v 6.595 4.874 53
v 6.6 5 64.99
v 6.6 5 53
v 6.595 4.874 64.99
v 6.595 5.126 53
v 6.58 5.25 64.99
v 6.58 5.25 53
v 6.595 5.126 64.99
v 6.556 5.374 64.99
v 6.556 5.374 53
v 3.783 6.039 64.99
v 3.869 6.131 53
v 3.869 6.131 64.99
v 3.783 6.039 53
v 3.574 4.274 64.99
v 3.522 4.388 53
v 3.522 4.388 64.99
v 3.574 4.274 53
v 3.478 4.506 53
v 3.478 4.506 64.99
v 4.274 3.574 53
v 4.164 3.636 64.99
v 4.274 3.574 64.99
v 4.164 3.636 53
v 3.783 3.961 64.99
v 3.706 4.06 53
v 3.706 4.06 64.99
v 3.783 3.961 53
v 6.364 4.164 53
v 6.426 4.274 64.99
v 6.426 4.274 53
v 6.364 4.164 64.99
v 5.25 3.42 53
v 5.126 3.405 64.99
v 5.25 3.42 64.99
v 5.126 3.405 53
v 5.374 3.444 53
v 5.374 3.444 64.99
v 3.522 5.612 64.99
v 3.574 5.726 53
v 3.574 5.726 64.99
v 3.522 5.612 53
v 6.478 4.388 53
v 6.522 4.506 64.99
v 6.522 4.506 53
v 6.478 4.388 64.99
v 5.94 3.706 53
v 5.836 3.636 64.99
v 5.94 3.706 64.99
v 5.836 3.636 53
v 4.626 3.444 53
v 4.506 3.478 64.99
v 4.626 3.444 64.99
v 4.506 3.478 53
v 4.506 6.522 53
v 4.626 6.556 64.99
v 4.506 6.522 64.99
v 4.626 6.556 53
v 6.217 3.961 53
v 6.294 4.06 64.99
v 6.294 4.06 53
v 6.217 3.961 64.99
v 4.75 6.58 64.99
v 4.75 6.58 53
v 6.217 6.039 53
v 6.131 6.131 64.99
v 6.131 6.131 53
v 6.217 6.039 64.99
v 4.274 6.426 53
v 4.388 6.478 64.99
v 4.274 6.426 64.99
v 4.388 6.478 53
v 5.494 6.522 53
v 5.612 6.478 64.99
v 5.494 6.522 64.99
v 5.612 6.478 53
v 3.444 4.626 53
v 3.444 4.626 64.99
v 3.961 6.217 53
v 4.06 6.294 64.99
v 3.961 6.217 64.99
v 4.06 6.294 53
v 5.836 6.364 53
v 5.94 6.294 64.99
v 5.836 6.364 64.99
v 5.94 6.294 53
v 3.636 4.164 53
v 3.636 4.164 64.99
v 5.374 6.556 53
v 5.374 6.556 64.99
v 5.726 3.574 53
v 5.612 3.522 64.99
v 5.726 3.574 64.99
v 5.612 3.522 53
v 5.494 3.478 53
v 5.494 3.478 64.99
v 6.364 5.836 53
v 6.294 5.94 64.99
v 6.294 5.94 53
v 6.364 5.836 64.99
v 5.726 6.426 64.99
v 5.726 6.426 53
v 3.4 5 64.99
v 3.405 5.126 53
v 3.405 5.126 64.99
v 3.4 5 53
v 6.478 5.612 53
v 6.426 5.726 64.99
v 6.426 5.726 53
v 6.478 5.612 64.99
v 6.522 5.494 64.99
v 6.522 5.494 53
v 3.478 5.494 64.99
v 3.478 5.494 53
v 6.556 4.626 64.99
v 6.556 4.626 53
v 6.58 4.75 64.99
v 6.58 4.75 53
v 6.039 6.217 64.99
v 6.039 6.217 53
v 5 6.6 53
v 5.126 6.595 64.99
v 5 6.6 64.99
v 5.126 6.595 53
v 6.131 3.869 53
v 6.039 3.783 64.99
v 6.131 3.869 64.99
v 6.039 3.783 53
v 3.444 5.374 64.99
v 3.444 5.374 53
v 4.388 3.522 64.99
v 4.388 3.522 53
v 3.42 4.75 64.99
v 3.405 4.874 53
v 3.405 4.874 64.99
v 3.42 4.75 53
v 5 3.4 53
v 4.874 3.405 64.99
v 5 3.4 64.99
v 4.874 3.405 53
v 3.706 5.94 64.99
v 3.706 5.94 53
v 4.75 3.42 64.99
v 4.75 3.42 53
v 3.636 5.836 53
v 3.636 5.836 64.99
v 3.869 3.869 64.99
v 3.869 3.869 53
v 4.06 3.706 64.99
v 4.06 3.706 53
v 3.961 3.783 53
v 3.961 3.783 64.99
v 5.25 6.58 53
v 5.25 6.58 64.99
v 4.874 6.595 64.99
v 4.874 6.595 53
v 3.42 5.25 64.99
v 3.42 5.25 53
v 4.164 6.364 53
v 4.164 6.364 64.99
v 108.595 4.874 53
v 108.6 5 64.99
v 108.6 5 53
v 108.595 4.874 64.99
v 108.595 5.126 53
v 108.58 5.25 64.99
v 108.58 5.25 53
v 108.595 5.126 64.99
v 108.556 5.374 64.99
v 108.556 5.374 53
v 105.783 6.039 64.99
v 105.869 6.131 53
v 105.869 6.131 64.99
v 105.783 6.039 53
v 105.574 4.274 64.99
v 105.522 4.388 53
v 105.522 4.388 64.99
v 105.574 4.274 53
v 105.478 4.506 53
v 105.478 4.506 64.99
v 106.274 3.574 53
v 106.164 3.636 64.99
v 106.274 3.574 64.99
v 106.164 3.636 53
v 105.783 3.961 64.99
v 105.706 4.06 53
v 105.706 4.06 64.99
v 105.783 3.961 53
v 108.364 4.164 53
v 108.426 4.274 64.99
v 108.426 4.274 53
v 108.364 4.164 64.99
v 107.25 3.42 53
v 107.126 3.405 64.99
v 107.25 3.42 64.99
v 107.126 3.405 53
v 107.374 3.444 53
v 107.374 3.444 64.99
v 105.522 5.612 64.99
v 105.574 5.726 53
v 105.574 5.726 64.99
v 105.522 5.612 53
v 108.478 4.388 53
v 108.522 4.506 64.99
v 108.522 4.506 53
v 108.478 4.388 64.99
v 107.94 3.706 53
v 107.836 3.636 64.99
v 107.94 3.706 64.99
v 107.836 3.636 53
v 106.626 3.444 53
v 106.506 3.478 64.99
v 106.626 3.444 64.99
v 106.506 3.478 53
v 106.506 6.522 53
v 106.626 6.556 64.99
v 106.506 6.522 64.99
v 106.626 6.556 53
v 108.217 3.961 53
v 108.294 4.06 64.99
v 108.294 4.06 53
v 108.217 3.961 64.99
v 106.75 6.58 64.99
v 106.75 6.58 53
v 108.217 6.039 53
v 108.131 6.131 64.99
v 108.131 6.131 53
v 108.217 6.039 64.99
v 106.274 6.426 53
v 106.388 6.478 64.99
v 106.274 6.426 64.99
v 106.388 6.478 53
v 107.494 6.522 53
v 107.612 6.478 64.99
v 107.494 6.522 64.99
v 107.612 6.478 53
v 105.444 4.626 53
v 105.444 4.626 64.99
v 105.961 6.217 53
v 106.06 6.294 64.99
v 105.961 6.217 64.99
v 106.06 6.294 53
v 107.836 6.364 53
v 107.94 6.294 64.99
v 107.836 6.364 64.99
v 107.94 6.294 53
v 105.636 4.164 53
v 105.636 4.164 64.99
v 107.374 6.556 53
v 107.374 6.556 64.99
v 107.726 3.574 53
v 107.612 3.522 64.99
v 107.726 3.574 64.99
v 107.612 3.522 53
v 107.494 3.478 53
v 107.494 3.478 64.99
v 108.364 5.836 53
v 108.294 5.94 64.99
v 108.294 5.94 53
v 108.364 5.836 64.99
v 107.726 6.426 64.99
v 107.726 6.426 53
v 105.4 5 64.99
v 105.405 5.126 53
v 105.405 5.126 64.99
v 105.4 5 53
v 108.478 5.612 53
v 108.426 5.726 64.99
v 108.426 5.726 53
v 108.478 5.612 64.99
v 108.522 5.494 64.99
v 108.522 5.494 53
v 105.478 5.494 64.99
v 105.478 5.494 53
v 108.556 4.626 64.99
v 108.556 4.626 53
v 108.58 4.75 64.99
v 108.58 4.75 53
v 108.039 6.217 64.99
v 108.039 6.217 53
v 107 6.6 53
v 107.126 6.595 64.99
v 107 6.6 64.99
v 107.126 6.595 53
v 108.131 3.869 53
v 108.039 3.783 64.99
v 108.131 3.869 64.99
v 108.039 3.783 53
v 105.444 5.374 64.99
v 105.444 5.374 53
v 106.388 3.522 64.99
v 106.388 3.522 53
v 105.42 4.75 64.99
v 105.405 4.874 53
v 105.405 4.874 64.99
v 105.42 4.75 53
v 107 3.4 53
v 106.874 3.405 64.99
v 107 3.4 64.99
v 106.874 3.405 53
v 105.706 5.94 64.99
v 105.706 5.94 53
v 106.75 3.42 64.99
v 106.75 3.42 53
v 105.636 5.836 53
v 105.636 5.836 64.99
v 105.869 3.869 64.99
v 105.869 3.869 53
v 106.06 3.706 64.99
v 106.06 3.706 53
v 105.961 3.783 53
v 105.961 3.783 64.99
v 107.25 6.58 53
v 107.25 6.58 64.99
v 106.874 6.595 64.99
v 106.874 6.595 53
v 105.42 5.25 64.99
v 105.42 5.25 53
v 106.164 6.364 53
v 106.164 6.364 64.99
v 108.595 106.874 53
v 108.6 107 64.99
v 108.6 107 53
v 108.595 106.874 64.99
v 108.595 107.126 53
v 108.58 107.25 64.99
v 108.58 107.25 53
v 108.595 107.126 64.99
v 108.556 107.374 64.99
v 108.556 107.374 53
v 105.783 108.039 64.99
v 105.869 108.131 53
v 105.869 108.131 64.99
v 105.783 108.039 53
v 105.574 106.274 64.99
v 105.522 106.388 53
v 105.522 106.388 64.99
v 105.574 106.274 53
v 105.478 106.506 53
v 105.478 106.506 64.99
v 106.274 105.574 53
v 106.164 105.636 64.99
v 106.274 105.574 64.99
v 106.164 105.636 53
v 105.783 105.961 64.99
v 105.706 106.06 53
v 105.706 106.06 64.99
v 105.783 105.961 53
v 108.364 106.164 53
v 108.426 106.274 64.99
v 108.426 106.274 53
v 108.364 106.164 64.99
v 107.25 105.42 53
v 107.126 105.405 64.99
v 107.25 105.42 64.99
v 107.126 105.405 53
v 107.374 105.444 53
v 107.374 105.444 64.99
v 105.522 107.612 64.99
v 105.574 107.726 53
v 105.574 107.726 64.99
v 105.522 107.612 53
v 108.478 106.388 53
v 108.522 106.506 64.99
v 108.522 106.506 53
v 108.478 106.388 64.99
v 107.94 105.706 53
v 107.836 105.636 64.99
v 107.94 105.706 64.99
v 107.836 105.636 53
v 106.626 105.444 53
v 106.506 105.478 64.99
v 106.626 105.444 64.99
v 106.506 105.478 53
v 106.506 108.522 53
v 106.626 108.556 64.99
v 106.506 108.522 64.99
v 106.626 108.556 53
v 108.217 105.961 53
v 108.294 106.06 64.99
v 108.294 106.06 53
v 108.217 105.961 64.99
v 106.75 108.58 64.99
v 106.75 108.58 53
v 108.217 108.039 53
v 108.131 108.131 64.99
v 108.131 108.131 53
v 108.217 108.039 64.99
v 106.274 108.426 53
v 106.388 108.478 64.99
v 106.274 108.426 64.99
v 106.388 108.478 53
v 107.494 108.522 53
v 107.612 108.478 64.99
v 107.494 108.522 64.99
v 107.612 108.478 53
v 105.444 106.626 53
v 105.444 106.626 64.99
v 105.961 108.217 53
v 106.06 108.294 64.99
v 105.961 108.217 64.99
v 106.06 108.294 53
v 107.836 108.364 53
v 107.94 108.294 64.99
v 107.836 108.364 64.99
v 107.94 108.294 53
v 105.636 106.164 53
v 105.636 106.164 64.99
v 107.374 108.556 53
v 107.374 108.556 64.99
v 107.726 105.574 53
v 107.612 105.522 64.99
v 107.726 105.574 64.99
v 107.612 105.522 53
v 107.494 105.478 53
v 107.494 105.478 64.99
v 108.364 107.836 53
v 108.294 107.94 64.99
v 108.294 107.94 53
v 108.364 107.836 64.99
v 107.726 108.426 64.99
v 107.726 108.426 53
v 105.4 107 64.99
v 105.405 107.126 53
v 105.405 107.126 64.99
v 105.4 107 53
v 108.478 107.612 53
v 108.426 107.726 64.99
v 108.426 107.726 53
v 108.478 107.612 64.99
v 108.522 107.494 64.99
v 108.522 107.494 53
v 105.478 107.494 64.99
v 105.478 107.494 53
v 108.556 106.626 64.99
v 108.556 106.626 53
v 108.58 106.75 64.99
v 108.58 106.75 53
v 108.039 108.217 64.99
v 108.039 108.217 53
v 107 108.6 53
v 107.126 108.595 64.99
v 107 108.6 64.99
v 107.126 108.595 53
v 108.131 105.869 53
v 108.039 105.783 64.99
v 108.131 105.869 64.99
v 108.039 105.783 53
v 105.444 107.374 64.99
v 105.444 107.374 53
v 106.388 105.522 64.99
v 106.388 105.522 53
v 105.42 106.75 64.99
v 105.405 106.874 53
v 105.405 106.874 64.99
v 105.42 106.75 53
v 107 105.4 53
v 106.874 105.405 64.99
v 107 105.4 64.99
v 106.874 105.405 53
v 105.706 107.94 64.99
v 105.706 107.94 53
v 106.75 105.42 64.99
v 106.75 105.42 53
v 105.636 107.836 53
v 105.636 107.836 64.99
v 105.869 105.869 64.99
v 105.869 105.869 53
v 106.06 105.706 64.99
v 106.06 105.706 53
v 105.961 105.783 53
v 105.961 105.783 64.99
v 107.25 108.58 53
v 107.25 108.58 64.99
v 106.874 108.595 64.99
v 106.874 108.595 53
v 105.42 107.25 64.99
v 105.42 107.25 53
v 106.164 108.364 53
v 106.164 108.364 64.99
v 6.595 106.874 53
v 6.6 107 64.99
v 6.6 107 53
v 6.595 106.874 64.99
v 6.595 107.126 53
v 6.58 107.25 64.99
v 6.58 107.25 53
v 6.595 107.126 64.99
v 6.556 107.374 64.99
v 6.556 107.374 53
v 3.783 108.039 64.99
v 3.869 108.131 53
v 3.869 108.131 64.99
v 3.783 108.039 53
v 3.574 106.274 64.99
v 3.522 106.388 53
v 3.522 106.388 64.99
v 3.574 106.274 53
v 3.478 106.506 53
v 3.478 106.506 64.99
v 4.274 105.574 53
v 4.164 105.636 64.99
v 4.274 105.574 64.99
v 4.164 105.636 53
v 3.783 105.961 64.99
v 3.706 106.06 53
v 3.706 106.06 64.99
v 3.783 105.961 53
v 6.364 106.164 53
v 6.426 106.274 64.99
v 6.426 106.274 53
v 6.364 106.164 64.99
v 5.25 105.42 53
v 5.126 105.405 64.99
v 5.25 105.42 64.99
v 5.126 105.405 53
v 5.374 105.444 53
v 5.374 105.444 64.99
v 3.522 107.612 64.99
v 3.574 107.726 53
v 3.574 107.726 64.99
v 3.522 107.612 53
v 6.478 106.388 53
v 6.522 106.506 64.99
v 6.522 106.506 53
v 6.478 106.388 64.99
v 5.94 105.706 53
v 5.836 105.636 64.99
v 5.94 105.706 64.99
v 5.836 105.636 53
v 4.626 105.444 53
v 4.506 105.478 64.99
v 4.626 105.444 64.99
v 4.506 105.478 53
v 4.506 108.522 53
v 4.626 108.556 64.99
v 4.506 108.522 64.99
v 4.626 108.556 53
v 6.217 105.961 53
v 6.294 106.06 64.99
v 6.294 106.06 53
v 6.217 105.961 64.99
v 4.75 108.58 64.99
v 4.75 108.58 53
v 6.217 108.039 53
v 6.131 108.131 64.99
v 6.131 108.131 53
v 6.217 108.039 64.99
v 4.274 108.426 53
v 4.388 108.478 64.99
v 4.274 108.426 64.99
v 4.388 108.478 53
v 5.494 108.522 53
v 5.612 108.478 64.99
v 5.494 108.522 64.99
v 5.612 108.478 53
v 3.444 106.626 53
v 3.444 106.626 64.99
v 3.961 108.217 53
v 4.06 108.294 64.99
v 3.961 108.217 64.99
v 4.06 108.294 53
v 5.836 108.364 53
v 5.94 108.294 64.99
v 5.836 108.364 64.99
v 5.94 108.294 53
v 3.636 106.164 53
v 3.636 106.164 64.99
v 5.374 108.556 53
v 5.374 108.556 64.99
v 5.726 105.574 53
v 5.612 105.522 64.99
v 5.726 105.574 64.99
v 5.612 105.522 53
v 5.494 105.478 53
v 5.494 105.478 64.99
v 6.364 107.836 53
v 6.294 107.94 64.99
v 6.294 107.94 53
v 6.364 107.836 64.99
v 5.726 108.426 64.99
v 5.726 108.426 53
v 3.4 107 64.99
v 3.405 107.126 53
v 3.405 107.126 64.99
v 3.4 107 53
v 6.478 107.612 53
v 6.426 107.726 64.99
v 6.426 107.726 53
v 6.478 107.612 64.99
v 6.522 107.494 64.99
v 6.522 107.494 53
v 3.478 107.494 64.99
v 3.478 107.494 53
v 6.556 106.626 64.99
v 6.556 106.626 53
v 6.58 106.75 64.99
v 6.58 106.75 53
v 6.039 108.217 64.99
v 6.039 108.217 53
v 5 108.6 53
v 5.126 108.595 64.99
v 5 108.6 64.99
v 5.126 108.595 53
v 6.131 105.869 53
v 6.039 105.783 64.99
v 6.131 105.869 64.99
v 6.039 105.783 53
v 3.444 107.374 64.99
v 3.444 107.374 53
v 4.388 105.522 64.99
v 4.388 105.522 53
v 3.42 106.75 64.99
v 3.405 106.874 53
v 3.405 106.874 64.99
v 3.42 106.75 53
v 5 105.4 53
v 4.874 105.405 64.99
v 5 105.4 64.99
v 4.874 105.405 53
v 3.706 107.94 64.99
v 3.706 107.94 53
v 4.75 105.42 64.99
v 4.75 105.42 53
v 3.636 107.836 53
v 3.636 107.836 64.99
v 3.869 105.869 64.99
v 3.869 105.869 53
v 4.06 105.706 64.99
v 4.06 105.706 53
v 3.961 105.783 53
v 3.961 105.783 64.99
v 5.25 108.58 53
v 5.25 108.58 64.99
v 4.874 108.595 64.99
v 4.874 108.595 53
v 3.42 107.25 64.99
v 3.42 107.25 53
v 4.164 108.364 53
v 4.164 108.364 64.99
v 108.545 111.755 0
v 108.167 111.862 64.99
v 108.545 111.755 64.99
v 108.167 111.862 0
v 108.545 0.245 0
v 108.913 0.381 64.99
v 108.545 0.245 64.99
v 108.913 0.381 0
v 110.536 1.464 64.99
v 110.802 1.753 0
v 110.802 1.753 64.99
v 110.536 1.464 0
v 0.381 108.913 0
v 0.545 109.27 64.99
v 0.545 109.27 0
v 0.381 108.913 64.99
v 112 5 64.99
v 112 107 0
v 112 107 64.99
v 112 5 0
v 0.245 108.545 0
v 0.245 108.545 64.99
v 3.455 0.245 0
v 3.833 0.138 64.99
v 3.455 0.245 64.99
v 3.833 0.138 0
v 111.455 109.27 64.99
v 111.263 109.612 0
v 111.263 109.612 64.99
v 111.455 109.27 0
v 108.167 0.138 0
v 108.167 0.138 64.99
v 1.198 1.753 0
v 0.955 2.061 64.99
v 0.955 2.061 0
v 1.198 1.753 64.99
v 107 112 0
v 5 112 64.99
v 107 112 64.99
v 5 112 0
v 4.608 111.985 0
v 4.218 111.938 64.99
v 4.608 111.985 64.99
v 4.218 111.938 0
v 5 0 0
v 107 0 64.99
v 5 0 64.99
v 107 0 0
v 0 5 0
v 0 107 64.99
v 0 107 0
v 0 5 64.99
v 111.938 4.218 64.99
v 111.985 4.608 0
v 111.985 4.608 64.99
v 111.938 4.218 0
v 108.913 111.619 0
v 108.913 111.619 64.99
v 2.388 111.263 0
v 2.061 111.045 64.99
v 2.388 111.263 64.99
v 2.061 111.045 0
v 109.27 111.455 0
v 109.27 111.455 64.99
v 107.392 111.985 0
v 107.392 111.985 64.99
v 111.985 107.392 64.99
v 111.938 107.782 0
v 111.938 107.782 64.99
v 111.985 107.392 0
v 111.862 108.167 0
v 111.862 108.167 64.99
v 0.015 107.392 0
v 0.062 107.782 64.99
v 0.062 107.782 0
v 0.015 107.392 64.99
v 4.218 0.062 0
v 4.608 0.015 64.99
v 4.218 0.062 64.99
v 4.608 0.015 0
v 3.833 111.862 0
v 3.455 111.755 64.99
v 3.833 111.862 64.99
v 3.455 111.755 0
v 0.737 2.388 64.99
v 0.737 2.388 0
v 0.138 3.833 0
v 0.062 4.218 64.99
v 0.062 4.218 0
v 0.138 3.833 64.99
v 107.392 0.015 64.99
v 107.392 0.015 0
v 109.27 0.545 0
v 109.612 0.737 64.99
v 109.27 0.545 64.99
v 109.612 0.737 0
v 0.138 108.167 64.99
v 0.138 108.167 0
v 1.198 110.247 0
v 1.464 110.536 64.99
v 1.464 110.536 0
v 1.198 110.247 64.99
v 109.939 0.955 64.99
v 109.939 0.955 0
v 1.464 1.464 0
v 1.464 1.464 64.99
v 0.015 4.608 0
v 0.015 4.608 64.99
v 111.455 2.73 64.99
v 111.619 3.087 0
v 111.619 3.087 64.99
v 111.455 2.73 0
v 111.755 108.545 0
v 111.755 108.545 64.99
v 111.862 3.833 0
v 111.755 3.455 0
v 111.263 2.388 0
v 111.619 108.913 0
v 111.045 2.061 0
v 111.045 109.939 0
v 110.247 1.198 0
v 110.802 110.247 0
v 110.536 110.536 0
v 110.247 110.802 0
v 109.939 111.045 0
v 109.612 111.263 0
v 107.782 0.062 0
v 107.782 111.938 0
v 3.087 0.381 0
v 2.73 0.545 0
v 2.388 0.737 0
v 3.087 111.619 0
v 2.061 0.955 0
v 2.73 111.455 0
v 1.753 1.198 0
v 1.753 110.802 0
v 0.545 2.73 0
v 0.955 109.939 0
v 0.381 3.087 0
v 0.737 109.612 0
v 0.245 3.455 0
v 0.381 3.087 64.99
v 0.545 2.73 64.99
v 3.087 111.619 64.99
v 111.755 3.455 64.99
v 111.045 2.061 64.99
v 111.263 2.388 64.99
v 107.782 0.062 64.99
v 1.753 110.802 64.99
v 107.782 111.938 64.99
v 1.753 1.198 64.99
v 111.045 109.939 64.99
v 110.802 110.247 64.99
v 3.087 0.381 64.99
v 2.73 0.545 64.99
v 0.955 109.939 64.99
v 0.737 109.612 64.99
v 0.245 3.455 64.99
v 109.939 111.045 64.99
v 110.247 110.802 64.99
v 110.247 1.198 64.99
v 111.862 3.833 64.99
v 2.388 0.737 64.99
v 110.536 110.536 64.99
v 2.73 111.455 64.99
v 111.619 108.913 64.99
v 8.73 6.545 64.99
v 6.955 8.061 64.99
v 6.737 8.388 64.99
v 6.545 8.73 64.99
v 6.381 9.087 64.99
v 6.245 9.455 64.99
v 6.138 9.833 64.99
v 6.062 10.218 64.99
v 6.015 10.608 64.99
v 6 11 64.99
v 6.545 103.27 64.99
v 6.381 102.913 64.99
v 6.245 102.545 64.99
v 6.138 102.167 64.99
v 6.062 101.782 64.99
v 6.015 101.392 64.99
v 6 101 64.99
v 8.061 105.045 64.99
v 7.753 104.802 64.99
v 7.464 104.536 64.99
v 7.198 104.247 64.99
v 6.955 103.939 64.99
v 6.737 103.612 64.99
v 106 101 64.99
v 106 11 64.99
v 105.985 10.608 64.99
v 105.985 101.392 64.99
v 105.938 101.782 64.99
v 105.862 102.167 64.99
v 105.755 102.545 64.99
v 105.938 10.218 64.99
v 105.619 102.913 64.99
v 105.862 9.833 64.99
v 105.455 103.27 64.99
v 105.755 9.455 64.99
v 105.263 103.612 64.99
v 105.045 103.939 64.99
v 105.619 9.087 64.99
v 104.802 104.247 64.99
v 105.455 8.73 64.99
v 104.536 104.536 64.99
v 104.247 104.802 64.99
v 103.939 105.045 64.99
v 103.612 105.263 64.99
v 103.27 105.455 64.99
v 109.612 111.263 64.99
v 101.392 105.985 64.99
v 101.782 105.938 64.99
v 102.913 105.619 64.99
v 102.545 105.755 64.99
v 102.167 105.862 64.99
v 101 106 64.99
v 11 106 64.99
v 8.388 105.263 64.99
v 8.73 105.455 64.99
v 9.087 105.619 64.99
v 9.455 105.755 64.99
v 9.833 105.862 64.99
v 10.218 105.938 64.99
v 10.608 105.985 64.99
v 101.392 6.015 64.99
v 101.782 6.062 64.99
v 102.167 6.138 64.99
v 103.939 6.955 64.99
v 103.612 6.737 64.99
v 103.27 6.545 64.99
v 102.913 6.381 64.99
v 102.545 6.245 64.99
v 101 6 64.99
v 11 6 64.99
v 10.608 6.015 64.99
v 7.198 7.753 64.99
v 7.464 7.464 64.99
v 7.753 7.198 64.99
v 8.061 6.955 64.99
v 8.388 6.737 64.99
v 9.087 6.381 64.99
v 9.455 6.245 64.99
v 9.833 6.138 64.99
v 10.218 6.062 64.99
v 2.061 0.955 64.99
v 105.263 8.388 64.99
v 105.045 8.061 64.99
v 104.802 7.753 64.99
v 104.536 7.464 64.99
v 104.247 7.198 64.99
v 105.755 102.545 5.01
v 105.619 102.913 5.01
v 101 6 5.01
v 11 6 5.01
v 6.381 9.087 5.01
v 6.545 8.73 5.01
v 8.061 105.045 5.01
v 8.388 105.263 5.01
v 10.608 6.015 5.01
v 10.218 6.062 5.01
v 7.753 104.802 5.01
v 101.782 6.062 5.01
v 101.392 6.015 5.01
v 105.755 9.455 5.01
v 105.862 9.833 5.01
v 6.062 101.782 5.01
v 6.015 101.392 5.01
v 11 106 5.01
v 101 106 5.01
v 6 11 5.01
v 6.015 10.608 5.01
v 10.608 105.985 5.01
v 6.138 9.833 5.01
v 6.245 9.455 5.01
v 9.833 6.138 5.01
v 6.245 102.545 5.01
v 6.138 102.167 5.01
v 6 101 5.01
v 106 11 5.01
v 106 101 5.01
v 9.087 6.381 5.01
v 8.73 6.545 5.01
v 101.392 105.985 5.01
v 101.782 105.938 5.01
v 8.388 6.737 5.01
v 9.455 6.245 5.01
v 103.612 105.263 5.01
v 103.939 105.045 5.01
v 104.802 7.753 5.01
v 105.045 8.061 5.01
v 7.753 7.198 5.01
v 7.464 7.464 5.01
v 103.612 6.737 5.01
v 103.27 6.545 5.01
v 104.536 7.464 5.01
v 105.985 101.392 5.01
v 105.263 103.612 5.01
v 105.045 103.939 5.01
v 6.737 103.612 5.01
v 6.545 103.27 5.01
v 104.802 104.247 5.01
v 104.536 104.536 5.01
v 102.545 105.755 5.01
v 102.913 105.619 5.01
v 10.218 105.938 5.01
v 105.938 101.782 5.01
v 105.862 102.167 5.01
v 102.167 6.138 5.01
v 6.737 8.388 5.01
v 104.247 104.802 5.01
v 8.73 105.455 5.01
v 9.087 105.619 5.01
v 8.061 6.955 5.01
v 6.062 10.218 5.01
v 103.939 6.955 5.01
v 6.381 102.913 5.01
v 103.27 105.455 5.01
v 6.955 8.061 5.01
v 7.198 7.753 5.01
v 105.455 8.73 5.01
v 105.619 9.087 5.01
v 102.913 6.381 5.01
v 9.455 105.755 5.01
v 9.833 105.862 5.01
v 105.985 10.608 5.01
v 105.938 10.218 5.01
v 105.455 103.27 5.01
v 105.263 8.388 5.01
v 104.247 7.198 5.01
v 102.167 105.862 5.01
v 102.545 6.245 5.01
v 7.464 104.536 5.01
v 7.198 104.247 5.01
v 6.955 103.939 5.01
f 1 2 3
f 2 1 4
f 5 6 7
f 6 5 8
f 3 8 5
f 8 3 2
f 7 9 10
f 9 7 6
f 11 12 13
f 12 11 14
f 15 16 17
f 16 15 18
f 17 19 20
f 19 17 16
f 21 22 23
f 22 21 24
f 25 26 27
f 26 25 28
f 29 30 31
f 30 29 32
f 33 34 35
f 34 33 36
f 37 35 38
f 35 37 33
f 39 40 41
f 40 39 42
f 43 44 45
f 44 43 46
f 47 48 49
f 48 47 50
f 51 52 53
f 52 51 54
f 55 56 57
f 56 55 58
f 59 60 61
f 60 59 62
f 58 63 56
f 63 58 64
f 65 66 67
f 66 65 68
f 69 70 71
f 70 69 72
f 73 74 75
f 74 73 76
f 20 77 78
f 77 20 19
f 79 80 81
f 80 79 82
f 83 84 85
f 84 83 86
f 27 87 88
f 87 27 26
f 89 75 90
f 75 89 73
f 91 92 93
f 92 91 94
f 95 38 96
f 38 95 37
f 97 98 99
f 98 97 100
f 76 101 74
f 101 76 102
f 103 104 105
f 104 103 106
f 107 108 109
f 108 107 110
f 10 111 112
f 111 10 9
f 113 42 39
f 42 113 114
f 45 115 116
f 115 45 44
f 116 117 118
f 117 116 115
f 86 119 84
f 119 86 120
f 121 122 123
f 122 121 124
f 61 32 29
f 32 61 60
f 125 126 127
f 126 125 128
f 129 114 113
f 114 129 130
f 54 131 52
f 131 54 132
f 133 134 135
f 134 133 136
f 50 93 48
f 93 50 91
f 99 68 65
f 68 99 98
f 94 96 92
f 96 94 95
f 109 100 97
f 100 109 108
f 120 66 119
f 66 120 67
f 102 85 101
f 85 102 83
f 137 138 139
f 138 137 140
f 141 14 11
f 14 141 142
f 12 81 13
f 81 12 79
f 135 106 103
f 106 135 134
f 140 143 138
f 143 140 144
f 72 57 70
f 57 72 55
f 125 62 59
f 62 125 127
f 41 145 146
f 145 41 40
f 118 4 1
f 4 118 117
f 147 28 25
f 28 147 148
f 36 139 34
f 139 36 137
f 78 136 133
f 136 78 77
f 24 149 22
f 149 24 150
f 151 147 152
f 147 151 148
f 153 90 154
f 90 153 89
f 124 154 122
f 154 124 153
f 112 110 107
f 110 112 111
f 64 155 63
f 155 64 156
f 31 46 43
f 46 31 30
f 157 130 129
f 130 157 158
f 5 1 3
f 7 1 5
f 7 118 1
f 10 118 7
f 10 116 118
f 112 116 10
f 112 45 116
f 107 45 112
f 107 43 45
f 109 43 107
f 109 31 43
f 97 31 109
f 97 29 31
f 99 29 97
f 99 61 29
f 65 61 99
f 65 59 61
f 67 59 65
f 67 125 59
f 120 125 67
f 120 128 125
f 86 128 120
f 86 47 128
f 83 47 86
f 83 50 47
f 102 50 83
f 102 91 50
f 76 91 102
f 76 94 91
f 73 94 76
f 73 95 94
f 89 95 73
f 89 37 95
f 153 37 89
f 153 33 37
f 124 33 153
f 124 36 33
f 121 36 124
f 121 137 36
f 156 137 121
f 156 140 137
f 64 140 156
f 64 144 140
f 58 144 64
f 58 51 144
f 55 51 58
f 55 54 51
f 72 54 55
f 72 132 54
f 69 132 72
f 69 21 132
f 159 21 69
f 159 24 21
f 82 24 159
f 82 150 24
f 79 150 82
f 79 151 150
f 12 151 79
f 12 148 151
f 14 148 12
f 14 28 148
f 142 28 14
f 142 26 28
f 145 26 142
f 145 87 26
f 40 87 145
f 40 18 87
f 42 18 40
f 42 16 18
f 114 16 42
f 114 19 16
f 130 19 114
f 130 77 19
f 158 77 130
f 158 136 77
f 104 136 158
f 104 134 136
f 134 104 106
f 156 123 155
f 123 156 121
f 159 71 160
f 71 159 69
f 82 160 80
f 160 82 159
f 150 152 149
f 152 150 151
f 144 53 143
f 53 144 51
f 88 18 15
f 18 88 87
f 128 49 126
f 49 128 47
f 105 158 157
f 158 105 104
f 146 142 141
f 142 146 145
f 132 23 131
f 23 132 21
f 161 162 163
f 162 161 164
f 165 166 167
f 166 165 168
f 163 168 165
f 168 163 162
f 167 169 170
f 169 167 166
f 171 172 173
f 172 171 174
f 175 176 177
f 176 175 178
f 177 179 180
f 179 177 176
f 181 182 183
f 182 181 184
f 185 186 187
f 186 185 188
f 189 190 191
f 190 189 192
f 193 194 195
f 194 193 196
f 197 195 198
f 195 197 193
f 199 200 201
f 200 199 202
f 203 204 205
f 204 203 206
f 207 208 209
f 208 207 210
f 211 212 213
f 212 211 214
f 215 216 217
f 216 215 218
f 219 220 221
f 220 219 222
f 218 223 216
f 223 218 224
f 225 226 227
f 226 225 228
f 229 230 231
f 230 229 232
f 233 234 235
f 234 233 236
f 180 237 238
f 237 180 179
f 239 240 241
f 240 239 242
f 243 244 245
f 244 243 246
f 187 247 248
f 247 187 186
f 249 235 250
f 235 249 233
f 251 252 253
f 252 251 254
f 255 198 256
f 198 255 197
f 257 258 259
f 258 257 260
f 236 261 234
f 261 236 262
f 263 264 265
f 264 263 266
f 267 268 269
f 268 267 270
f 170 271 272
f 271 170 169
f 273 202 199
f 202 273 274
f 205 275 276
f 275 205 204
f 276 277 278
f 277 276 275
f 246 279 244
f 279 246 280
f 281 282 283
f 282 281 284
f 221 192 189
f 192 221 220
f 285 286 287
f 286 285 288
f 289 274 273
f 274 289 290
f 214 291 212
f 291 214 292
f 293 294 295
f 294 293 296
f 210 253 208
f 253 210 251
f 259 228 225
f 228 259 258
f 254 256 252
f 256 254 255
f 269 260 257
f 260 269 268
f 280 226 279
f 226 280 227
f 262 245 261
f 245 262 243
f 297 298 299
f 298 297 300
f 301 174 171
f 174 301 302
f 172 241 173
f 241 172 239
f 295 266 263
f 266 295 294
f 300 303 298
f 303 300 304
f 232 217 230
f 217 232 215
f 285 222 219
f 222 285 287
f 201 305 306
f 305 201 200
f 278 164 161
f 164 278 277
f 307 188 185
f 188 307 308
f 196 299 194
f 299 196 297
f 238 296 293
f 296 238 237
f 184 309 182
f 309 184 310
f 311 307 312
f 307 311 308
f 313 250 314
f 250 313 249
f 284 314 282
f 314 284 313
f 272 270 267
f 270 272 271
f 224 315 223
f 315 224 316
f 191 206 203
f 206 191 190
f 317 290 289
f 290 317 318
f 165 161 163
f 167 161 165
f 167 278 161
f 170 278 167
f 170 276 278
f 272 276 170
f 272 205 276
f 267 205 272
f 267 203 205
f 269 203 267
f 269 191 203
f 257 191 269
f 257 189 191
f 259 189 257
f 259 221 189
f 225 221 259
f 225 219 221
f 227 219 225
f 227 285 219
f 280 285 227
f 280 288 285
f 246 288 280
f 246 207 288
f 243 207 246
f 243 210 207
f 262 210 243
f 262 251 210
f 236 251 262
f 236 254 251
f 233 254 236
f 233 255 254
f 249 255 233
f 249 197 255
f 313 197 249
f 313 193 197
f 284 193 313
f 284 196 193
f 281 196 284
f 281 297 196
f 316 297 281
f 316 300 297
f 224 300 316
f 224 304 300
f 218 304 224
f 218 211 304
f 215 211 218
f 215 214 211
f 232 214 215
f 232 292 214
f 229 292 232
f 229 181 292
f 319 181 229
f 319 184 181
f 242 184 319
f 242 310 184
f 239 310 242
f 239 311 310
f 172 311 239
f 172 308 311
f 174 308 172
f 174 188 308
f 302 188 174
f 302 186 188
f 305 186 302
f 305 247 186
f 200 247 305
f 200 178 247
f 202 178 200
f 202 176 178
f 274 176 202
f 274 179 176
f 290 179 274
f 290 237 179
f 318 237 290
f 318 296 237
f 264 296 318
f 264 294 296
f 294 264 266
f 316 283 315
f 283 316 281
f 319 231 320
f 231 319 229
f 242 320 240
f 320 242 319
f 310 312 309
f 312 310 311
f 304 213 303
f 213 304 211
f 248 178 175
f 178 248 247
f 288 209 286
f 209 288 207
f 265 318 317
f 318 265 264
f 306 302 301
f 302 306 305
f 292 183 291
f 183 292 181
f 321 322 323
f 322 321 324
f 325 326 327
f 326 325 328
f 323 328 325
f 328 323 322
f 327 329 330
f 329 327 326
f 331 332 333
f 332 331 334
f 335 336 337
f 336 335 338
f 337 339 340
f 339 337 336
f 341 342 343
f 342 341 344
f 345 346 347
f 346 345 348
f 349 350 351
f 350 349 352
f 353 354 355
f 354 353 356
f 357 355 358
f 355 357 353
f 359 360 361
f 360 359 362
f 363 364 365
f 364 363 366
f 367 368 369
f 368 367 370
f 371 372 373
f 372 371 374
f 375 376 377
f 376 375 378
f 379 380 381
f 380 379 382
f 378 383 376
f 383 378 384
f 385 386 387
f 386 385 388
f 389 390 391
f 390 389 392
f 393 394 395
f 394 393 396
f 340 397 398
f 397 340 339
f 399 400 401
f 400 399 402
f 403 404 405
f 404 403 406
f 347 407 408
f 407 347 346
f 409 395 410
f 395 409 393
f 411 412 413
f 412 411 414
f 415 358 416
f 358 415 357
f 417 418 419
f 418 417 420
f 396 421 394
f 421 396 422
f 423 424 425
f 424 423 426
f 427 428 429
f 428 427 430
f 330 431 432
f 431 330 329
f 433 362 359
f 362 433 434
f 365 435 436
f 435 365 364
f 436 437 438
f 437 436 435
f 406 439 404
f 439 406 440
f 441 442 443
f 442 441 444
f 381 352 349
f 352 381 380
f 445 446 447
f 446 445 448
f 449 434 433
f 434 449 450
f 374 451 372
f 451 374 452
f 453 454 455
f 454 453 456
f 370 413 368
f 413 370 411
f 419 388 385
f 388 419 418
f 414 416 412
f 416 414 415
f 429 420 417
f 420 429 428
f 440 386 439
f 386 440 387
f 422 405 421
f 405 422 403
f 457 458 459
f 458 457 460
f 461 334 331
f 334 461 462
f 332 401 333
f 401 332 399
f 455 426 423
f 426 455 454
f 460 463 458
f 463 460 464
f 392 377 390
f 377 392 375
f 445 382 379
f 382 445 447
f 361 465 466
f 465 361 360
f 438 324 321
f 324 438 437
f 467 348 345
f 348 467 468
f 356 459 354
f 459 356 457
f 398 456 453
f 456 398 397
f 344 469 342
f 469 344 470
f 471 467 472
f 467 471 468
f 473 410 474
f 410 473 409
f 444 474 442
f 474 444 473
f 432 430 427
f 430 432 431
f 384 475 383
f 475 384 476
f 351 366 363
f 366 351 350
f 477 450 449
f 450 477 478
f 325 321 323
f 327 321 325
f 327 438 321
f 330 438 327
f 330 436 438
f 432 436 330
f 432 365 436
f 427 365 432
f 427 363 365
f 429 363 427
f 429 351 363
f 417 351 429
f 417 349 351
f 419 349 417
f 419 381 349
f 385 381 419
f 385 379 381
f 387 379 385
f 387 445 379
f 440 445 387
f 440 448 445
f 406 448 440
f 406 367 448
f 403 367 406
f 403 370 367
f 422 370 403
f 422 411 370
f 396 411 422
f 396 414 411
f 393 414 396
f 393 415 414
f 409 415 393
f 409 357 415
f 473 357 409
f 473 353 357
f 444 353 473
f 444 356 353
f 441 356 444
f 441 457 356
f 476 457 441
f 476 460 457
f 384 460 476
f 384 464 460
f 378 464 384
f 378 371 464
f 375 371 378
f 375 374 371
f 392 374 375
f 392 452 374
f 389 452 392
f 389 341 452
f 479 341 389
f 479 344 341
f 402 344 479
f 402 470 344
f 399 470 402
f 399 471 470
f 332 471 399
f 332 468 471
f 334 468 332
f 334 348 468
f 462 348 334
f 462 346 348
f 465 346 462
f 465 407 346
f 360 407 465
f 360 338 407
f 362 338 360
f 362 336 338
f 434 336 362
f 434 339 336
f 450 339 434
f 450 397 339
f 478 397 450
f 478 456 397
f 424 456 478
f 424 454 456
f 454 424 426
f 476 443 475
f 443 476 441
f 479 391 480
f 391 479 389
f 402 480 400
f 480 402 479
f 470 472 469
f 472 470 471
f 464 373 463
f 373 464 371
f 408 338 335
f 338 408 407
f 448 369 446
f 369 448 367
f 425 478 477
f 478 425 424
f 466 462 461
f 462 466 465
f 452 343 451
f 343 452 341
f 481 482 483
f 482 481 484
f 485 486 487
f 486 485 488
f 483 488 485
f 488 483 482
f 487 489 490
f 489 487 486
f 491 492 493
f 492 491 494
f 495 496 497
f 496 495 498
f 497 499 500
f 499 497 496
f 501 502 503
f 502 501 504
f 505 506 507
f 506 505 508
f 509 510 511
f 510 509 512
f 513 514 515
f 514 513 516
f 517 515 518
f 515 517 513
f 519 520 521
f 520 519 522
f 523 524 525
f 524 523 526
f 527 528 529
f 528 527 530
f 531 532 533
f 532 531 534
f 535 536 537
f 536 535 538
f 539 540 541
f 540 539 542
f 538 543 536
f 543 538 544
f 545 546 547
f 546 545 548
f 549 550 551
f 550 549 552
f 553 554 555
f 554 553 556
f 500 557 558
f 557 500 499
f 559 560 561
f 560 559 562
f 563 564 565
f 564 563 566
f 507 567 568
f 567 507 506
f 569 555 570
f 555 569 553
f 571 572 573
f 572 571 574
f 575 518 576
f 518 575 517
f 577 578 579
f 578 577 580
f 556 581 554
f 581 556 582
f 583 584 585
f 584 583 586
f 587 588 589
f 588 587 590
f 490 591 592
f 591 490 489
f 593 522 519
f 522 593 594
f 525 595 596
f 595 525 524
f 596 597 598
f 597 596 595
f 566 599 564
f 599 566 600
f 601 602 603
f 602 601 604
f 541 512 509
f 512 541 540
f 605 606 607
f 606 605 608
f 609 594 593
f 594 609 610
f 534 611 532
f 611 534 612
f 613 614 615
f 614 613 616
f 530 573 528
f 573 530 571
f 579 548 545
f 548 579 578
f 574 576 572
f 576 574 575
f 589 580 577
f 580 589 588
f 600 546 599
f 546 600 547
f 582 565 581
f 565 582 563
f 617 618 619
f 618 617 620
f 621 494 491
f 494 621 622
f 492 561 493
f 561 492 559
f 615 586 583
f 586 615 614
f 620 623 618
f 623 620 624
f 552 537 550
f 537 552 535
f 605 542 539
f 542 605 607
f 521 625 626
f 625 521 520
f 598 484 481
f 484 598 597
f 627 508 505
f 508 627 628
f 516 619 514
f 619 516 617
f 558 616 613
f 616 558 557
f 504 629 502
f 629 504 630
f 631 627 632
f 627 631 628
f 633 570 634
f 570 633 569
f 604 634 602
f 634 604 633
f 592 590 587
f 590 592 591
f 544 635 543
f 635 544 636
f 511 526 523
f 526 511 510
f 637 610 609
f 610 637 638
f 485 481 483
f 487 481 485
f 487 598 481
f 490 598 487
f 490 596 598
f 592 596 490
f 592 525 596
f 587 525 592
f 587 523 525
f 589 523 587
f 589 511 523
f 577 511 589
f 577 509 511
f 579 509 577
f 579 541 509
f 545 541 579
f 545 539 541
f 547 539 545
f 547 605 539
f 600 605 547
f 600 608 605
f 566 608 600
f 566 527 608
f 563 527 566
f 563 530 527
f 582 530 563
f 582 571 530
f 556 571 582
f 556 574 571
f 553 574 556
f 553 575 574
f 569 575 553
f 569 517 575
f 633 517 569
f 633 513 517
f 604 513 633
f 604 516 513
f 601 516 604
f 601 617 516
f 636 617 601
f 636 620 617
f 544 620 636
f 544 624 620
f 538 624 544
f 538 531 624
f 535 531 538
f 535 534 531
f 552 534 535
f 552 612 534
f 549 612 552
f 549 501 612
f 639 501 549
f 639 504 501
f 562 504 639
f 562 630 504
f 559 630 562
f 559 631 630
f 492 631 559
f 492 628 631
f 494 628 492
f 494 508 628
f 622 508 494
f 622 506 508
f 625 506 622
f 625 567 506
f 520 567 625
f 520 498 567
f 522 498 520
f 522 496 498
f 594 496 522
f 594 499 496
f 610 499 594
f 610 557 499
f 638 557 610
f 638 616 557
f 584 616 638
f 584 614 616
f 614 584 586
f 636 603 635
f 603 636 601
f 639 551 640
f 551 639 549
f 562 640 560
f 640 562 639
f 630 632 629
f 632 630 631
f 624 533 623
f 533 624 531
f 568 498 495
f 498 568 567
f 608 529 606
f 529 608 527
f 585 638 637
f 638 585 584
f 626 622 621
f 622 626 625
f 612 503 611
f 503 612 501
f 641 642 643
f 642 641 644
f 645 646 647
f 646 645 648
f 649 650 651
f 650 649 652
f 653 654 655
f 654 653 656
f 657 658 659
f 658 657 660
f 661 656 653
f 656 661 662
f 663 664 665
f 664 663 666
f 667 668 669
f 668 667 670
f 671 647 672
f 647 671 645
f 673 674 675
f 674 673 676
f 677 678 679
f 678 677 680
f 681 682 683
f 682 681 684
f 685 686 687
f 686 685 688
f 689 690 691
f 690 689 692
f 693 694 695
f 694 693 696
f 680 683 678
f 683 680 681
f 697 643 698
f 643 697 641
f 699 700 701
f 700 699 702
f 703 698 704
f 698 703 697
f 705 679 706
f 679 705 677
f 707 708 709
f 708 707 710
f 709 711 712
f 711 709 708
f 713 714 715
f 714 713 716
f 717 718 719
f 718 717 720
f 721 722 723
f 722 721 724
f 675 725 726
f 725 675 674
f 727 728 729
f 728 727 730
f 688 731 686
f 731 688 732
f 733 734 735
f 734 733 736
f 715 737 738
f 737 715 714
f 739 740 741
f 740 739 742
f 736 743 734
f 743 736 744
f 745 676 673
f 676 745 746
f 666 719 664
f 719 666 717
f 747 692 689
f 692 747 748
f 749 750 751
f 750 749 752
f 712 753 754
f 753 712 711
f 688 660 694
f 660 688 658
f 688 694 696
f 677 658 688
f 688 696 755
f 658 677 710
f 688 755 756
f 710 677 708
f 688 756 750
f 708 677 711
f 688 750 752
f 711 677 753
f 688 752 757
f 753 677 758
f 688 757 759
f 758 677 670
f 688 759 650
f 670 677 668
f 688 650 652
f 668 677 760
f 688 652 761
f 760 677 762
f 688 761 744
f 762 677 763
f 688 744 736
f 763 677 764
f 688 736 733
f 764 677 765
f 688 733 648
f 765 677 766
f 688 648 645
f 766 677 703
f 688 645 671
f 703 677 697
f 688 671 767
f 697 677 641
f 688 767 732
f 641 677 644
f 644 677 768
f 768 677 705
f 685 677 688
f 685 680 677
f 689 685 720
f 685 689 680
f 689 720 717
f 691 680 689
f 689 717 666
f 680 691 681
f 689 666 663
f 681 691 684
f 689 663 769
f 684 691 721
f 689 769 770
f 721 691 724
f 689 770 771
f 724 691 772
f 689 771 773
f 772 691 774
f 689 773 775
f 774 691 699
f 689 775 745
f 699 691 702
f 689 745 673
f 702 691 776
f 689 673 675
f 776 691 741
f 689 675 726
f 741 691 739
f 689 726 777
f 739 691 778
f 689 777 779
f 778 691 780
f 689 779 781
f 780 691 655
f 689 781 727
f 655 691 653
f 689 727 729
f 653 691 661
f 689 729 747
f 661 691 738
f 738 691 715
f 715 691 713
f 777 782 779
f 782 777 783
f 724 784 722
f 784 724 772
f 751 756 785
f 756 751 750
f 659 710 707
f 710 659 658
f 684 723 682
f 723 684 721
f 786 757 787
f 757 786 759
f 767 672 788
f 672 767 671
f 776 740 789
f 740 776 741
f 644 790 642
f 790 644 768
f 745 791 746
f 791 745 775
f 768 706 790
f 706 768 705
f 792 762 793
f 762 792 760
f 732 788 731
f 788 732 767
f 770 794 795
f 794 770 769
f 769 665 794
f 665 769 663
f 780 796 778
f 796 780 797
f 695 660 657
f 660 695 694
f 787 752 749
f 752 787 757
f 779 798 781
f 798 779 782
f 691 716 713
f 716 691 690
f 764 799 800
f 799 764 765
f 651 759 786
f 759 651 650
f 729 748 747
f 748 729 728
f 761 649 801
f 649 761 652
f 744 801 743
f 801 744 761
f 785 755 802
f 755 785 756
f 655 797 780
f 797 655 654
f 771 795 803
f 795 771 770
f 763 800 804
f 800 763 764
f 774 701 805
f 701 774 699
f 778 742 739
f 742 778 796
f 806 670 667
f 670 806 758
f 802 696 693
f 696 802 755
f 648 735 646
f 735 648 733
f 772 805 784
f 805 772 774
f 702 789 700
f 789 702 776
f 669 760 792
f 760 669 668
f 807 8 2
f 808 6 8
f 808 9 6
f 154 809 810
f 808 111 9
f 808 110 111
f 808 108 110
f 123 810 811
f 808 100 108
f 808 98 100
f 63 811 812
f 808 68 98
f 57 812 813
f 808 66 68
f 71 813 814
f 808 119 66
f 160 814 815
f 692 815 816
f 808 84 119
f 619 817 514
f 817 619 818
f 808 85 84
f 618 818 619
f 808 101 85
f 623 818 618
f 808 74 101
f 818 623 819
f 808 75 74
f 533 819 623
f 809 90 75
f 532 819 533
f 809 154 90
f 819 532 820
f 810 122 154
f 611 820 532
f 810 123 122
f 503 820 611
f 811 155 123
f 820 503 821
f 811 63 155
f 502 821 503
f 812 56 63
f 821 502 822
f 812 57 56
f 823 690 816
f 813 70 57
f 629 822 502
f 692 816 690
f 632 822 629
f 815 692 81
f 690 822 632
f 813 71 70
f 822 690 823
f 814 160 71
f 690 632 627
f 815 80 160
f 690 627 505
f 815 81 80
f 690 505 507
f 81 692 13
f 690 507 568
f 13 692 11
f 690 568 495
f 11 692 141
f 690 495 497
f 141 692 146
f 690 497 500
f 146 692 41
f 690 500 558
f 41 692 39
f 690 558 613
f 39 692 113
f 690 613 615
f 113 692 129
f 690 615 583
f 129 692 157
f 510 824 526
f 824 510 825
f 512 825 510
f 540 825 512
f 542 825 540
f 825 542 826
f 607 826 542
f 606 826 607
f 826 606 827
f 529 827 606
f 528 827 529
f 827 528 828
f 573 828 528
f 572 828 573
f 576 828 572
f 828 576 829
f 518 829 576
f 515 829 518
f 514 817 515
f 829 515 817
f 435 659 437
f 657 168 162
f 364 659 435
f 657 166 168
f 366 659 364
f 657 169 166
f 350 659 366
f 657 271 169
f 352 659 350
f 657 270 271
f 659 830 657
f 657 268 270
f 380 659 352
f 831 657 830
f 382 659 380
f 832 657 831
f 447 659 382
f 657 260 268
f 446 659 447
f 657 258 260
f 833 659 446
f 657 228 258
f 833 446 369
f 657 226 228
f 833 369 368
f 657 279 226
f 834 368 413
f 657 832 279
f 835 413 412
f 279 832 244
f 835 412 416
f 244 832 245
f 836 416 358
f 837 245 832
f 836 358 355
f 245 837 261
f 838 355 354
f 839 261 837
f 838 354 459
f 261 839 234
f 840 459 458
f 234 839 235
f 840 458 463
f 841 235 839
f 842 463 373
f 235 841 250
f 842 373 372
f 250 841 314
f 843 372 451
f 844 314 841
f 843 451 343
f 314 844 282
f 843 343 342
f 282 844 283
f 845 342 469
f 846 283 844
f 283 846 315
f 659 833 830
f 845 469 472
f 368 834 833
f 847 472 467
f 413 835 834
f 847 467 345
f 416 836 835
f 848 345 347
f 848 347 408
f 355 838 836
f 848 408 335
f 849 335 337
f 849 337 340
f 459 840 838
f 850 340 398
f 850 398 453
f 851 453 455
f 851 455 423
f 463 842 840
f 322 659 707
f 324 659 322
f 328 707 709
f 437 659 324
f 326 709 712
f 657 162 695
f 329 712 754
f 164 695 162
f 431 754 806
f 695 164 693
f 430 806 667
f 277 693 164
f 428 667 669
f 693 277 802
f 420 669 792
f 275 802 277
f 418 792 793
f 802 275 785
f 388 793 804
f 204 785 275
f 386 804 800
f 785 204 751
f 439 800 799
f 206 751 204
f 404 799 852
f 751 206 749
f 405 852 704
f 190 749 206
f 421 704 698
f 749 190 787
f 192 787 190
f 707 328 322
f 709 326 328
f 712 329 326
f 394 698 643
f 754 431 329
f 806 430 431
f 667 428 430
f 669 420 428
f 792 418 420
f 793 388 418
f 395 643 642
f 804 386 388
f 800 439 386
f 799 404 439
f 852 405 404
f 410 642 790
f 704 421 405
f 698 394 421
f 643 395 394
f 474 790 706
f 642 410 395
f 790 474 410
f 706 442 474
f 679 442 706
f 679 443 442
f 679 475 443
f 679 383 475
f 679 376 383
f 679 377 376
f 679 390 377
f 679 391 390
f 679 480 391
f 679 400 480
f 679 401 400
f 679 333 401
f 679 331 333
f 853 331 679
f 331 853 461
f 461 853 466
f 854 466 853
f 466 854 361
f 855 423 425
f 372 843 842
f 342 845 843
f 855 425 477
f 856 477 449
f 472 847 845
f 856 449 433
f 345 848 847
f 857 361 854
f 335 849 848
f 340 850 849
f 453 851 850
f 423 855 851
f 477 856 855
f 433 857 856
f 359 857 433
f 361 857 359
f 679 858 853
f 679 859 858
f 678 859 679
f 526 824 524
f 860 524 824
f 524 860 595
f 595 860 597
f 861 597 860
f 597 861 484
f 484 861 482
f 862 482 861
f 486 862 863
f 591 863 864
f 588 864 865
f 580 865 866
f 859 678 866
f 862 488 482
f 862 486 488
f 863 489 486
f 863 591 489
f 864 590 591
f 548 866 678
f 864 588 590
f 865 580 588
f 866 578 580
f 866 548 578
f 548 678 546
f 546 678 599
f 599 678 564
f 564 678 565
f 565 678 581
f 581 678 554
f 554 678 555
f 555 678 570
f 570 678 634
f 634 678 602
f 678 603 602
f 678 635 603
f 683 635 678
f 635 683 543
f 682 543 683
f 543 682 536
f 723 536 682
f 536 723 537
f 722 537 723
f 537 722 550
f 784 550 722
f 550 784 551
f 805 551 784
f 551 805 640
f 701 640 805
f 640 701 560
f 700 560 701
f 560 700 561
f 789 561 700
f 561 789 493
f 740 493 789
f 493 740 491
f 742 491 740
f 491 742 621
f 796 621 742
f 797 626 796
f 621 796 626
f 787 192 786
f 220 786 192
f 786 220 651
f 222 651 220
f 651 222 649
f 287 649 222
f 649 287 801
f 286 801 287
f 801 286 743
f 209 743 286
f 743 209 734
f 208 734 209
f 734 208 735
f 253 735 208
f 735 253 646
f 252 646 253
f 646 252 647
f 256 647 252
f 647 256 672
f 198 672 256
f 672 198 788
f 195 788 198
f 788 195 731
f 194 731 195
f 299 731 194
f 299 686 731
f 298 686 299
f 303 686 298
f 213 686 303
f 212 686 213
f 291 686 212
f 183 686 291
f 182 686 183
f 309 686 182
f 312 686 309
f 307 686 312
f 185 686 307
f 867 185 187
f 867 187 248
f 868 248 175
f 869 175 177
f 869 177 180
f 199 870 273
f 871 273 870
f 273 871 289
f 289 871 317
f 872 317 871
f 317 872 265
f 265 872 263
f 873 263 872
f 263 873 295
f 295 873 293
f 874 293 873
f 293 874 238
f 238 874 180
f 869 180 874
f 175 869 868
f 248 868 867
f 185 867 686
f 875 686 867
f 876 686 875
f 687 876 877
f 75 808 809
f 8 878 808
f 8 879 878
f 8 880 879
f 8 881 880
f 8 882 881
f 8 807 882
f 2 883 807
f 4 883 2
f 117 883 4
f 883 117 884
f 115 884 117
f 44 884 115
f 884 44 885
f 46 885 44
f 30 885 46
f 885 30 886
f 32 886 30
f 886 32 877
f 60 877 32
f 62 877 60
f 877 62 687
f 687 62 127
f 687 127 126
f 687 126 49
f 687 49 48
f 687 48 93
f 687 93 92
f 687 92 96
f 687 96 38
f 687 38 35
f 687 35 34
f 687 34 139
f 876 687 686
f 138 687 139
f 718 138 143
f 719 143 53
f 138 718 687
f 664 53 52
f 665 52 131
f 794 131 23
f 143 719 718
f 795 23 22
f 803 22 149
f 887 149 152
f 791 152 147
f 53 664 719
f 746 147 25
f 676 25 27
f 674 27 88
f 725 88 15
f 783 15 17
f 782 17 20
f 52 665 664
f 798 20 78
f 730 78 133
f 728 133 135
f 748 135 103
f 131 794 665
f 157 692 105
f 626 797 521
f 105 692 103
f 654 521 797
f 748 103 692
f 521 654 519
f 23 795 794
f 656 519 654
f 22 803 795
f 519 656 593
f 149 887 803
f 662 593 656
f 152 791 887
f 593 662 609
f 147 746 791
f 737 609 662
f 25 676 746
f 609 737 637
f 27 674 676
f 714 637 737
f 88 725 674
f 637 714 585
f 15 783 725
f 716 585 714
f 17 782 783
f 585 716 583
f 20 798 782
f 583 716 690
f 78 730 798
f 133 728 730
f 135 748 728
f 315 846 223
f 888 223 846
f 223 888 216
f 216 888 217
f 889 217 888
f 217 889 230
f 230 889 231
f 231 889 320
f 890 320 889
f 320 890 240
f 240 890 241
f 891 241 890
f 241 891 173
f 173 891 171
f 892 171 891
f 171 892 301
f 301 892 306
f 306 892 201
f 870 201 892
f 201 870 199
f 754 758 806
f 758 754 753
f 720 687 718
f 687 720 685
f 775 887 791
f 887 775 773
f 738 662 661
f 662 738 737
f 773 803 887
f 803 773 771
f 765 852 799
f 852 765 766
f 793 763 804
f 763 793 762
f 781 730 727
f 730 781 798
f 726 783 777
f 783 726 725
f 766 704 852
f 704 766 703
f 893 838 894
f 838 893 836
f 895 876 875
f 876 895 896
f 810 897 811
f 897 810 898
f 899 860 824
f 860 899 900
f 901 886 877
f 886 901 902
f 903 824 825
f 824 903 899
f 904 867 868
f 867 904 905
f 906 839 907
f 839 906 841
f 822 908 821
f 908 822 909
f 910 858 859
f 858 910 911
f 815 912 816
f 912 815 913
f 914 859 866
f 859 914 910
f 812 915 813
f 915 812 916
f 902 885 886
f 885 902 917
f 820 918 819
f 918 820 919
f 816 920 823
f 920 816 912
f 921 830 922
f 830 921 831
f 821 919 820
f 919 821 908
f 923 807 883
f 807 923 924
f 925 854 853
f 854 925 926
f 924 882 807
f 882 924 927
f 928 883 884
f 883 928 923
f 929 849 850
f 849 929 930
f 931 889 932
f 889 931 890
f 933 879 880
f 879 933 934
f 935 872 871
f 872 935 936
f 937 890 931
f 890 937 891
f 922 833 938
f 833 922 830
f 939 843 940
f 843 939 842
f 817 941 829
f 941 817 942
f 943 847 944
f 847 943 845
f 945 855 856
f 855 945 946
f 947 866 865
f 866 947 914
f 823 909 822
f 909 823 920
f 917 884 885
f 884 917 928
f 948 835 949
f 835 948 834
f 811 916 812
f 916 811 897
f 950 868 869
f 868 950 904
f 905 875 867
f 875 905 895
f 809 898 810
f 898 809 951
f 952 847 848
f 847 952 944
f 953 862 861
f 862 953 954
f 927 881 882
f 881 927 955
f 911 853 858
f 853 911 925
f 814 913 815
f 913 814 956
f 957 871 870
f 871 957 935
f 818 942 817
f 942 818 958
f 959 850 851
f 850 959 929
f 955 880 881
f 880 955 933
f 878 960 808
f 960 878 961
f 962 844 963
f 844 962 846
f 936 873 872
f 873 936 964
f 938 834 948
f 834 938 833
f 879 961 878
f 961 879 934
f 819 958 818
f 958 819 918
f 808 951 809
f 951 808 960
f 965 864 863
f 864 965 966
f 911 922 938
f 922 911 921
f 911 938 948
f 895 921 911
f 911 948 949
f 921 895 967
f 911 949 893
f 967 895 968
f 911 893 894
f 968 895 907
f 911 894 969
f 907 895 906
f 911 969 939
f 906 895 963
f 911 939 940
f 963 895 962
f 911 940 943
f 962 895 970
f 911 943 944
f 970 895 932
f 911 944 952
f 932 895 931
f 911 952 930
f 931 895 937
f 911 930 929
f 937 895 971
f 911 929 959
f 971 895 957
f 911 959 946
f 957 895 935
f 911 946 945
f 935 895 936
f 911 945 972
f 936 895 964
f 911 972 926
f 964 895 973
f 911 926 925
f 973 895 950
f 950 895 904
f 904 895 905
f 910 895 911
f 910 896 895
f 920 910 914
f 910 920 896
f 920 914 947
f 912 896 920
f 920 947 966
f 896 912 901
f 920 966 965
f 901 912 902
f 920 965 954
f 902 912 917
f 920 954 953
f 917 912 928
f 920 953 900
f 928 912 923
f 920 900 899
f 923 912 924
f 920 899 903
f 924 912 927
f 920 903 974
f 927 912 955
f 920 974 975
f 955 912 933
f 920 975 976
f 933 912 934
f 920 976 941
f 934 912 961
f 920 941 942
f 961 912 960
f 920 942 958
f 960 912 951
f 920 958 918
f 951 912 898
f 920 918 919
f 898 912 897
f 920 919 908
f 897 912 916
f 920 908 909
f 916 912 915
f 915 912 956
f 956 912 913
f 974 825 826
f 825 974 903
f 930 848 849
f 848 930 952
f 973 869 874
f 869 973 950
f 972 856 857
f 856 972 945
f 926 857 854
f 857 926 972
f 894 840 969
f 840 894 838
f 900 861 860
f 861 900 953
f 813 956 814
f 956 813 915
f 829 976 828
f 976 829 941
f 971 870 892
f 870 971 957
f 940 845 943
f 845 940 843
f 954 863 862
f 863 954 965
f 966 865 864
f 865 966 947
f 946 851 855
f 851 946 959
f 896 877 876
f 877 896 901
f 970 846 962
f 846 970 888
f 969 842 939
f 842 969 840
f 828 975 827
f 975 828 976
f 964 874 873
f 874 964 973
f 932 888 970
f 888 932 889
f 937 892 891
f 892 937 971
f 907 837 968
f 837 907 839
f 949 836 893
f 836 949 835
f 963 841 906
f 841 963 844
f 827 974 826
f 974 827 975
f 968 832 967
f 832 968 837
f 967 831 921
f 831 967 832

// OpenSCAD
/*
makerspace workshop 2023-09-02
author: andimoto
*/
$fn=80;

/* [box dimensions] */
innerBoxX = 100;
innerBoxY = 100;
innerBoxZ = 60;

wallThickness = 6;
bottomThickness = 5;

edgeRadius = 5;

/* [lid] */
lidThickness = 5;
lidClearance = 0.4;
lidFixZ = 1;

/* [screw dimensions] */
screwDia = 3;
screwDiaTolerance = 0.2;
screwLen = 12;
screwHeadDia = 6;
screwHeadThick = 3;

/* [other parameters] */
extra = 0.01;

module box()
{
  difference()
  {
    translate([edgeRadius,edgeRadius,0])
    minkowski()
    {
      cube([innerBoxX+wallThickness*2-edgeRadius*2,
        innerBoxY+wallThickness*2-edgeRadius*2,
        innerBoxZ+bottomThickness-extra*2]);
      cylinder(r=edgeRadius, h=extra);
    }

    translate([edgeRadius+wallThickness,edgeRadius+wallThickness,bottomThickness+extra])
    minkowski()
    {
      cube([innerBoxX-edgeRadius*2,
        innerBoxY-edgeRadius*2,
        innerBoxZ-extra*2]);
      cylinder(r=edgeRadius, h=extra);
    }

    translate([0,0,innerBoxZ+bottomThickness])
    translate([0,0,screwHeadThick+0.2])
    mirror([0,0,1])
    screws(screwDia+screwDiaTolerance,screwHeadDia,screwHeadThick);
  }
}

box();


module lid()
{
  difference()
  {
    union()
    {
      translate([edgeRadius,edgeRadius,0])
      minkowski()
      {
        cube([innerBoxX+wallThickness*2-edgeRadius*2,
          innerBoxY+wallThickness*2-edgeRadius*2,
          lidThickness-extra*2]);
        cylinder(r=edgeRadius, h=extra);
      }
      translate([edgeRadius+wallThickness+lidClearance,
        edgeRadius+wallThickness+lidClearance,0])
      minkowski()
      {
        cube([innerBoxX-lidClearance*2-edgeRadius*2,
          innerBoxY-lidClearance*2-edgeRadius*2,
          lidFixZ+lidThickness-extra*2]);
        cylinder(r=edgeRadius, h=extra);
      }
    } /* union */

    translate([0,0,-extra])
    screws(screwDia+screwDiaTolerance*2,screwHeadDia,screwHeadThick+0.5);

  }
}
/* lid(); */

screwPlacement = [
[wallThickness-1,wallThickness-1],
[innerBoxX+wallThickness+1,wallThickness-1],
[innerBoxX+wallThickness+1,innerBoxY+wallThickness+1],
[wallThickness-1,innerBoxY+wallThickness+1]
];

/* screws(screwDia+screwDiaTolerance,screwHeadDia,screwHeadThick+0.5); */
module screws(screwD = 3, screwHeadD = 6, screwHeadThickness = 3)
{
  for (p=screwPlacement) {
    translate([p[0],p[1],0])
    screw(screwD, screwHeadD, screwHeadThickness);
  }

}

/* screw(screwD=3, screwHeadD = 6, screwHeadThickness =3); */
module screw(screwD = 3, screwHeadD = 6, screwHeadThickness = 3)
{
  union()
  {
    /* head */
    cylinder(r=screwHeadD/2, h=screwHeadThickness);
    /* screw */
    translate([0,0,screwHeadThickness+0.2])
    cylinder(r = screwD/2, h=screwLen);

    translate([0,0,screwHeadThickness])
    intersection()
    {
      cylinder(r=screwHeadD/2,h=0.2);
      translate([0,0,0.1])
        cube([screwHeadD,screwD,0.2],center=true);
    }
  }
}
